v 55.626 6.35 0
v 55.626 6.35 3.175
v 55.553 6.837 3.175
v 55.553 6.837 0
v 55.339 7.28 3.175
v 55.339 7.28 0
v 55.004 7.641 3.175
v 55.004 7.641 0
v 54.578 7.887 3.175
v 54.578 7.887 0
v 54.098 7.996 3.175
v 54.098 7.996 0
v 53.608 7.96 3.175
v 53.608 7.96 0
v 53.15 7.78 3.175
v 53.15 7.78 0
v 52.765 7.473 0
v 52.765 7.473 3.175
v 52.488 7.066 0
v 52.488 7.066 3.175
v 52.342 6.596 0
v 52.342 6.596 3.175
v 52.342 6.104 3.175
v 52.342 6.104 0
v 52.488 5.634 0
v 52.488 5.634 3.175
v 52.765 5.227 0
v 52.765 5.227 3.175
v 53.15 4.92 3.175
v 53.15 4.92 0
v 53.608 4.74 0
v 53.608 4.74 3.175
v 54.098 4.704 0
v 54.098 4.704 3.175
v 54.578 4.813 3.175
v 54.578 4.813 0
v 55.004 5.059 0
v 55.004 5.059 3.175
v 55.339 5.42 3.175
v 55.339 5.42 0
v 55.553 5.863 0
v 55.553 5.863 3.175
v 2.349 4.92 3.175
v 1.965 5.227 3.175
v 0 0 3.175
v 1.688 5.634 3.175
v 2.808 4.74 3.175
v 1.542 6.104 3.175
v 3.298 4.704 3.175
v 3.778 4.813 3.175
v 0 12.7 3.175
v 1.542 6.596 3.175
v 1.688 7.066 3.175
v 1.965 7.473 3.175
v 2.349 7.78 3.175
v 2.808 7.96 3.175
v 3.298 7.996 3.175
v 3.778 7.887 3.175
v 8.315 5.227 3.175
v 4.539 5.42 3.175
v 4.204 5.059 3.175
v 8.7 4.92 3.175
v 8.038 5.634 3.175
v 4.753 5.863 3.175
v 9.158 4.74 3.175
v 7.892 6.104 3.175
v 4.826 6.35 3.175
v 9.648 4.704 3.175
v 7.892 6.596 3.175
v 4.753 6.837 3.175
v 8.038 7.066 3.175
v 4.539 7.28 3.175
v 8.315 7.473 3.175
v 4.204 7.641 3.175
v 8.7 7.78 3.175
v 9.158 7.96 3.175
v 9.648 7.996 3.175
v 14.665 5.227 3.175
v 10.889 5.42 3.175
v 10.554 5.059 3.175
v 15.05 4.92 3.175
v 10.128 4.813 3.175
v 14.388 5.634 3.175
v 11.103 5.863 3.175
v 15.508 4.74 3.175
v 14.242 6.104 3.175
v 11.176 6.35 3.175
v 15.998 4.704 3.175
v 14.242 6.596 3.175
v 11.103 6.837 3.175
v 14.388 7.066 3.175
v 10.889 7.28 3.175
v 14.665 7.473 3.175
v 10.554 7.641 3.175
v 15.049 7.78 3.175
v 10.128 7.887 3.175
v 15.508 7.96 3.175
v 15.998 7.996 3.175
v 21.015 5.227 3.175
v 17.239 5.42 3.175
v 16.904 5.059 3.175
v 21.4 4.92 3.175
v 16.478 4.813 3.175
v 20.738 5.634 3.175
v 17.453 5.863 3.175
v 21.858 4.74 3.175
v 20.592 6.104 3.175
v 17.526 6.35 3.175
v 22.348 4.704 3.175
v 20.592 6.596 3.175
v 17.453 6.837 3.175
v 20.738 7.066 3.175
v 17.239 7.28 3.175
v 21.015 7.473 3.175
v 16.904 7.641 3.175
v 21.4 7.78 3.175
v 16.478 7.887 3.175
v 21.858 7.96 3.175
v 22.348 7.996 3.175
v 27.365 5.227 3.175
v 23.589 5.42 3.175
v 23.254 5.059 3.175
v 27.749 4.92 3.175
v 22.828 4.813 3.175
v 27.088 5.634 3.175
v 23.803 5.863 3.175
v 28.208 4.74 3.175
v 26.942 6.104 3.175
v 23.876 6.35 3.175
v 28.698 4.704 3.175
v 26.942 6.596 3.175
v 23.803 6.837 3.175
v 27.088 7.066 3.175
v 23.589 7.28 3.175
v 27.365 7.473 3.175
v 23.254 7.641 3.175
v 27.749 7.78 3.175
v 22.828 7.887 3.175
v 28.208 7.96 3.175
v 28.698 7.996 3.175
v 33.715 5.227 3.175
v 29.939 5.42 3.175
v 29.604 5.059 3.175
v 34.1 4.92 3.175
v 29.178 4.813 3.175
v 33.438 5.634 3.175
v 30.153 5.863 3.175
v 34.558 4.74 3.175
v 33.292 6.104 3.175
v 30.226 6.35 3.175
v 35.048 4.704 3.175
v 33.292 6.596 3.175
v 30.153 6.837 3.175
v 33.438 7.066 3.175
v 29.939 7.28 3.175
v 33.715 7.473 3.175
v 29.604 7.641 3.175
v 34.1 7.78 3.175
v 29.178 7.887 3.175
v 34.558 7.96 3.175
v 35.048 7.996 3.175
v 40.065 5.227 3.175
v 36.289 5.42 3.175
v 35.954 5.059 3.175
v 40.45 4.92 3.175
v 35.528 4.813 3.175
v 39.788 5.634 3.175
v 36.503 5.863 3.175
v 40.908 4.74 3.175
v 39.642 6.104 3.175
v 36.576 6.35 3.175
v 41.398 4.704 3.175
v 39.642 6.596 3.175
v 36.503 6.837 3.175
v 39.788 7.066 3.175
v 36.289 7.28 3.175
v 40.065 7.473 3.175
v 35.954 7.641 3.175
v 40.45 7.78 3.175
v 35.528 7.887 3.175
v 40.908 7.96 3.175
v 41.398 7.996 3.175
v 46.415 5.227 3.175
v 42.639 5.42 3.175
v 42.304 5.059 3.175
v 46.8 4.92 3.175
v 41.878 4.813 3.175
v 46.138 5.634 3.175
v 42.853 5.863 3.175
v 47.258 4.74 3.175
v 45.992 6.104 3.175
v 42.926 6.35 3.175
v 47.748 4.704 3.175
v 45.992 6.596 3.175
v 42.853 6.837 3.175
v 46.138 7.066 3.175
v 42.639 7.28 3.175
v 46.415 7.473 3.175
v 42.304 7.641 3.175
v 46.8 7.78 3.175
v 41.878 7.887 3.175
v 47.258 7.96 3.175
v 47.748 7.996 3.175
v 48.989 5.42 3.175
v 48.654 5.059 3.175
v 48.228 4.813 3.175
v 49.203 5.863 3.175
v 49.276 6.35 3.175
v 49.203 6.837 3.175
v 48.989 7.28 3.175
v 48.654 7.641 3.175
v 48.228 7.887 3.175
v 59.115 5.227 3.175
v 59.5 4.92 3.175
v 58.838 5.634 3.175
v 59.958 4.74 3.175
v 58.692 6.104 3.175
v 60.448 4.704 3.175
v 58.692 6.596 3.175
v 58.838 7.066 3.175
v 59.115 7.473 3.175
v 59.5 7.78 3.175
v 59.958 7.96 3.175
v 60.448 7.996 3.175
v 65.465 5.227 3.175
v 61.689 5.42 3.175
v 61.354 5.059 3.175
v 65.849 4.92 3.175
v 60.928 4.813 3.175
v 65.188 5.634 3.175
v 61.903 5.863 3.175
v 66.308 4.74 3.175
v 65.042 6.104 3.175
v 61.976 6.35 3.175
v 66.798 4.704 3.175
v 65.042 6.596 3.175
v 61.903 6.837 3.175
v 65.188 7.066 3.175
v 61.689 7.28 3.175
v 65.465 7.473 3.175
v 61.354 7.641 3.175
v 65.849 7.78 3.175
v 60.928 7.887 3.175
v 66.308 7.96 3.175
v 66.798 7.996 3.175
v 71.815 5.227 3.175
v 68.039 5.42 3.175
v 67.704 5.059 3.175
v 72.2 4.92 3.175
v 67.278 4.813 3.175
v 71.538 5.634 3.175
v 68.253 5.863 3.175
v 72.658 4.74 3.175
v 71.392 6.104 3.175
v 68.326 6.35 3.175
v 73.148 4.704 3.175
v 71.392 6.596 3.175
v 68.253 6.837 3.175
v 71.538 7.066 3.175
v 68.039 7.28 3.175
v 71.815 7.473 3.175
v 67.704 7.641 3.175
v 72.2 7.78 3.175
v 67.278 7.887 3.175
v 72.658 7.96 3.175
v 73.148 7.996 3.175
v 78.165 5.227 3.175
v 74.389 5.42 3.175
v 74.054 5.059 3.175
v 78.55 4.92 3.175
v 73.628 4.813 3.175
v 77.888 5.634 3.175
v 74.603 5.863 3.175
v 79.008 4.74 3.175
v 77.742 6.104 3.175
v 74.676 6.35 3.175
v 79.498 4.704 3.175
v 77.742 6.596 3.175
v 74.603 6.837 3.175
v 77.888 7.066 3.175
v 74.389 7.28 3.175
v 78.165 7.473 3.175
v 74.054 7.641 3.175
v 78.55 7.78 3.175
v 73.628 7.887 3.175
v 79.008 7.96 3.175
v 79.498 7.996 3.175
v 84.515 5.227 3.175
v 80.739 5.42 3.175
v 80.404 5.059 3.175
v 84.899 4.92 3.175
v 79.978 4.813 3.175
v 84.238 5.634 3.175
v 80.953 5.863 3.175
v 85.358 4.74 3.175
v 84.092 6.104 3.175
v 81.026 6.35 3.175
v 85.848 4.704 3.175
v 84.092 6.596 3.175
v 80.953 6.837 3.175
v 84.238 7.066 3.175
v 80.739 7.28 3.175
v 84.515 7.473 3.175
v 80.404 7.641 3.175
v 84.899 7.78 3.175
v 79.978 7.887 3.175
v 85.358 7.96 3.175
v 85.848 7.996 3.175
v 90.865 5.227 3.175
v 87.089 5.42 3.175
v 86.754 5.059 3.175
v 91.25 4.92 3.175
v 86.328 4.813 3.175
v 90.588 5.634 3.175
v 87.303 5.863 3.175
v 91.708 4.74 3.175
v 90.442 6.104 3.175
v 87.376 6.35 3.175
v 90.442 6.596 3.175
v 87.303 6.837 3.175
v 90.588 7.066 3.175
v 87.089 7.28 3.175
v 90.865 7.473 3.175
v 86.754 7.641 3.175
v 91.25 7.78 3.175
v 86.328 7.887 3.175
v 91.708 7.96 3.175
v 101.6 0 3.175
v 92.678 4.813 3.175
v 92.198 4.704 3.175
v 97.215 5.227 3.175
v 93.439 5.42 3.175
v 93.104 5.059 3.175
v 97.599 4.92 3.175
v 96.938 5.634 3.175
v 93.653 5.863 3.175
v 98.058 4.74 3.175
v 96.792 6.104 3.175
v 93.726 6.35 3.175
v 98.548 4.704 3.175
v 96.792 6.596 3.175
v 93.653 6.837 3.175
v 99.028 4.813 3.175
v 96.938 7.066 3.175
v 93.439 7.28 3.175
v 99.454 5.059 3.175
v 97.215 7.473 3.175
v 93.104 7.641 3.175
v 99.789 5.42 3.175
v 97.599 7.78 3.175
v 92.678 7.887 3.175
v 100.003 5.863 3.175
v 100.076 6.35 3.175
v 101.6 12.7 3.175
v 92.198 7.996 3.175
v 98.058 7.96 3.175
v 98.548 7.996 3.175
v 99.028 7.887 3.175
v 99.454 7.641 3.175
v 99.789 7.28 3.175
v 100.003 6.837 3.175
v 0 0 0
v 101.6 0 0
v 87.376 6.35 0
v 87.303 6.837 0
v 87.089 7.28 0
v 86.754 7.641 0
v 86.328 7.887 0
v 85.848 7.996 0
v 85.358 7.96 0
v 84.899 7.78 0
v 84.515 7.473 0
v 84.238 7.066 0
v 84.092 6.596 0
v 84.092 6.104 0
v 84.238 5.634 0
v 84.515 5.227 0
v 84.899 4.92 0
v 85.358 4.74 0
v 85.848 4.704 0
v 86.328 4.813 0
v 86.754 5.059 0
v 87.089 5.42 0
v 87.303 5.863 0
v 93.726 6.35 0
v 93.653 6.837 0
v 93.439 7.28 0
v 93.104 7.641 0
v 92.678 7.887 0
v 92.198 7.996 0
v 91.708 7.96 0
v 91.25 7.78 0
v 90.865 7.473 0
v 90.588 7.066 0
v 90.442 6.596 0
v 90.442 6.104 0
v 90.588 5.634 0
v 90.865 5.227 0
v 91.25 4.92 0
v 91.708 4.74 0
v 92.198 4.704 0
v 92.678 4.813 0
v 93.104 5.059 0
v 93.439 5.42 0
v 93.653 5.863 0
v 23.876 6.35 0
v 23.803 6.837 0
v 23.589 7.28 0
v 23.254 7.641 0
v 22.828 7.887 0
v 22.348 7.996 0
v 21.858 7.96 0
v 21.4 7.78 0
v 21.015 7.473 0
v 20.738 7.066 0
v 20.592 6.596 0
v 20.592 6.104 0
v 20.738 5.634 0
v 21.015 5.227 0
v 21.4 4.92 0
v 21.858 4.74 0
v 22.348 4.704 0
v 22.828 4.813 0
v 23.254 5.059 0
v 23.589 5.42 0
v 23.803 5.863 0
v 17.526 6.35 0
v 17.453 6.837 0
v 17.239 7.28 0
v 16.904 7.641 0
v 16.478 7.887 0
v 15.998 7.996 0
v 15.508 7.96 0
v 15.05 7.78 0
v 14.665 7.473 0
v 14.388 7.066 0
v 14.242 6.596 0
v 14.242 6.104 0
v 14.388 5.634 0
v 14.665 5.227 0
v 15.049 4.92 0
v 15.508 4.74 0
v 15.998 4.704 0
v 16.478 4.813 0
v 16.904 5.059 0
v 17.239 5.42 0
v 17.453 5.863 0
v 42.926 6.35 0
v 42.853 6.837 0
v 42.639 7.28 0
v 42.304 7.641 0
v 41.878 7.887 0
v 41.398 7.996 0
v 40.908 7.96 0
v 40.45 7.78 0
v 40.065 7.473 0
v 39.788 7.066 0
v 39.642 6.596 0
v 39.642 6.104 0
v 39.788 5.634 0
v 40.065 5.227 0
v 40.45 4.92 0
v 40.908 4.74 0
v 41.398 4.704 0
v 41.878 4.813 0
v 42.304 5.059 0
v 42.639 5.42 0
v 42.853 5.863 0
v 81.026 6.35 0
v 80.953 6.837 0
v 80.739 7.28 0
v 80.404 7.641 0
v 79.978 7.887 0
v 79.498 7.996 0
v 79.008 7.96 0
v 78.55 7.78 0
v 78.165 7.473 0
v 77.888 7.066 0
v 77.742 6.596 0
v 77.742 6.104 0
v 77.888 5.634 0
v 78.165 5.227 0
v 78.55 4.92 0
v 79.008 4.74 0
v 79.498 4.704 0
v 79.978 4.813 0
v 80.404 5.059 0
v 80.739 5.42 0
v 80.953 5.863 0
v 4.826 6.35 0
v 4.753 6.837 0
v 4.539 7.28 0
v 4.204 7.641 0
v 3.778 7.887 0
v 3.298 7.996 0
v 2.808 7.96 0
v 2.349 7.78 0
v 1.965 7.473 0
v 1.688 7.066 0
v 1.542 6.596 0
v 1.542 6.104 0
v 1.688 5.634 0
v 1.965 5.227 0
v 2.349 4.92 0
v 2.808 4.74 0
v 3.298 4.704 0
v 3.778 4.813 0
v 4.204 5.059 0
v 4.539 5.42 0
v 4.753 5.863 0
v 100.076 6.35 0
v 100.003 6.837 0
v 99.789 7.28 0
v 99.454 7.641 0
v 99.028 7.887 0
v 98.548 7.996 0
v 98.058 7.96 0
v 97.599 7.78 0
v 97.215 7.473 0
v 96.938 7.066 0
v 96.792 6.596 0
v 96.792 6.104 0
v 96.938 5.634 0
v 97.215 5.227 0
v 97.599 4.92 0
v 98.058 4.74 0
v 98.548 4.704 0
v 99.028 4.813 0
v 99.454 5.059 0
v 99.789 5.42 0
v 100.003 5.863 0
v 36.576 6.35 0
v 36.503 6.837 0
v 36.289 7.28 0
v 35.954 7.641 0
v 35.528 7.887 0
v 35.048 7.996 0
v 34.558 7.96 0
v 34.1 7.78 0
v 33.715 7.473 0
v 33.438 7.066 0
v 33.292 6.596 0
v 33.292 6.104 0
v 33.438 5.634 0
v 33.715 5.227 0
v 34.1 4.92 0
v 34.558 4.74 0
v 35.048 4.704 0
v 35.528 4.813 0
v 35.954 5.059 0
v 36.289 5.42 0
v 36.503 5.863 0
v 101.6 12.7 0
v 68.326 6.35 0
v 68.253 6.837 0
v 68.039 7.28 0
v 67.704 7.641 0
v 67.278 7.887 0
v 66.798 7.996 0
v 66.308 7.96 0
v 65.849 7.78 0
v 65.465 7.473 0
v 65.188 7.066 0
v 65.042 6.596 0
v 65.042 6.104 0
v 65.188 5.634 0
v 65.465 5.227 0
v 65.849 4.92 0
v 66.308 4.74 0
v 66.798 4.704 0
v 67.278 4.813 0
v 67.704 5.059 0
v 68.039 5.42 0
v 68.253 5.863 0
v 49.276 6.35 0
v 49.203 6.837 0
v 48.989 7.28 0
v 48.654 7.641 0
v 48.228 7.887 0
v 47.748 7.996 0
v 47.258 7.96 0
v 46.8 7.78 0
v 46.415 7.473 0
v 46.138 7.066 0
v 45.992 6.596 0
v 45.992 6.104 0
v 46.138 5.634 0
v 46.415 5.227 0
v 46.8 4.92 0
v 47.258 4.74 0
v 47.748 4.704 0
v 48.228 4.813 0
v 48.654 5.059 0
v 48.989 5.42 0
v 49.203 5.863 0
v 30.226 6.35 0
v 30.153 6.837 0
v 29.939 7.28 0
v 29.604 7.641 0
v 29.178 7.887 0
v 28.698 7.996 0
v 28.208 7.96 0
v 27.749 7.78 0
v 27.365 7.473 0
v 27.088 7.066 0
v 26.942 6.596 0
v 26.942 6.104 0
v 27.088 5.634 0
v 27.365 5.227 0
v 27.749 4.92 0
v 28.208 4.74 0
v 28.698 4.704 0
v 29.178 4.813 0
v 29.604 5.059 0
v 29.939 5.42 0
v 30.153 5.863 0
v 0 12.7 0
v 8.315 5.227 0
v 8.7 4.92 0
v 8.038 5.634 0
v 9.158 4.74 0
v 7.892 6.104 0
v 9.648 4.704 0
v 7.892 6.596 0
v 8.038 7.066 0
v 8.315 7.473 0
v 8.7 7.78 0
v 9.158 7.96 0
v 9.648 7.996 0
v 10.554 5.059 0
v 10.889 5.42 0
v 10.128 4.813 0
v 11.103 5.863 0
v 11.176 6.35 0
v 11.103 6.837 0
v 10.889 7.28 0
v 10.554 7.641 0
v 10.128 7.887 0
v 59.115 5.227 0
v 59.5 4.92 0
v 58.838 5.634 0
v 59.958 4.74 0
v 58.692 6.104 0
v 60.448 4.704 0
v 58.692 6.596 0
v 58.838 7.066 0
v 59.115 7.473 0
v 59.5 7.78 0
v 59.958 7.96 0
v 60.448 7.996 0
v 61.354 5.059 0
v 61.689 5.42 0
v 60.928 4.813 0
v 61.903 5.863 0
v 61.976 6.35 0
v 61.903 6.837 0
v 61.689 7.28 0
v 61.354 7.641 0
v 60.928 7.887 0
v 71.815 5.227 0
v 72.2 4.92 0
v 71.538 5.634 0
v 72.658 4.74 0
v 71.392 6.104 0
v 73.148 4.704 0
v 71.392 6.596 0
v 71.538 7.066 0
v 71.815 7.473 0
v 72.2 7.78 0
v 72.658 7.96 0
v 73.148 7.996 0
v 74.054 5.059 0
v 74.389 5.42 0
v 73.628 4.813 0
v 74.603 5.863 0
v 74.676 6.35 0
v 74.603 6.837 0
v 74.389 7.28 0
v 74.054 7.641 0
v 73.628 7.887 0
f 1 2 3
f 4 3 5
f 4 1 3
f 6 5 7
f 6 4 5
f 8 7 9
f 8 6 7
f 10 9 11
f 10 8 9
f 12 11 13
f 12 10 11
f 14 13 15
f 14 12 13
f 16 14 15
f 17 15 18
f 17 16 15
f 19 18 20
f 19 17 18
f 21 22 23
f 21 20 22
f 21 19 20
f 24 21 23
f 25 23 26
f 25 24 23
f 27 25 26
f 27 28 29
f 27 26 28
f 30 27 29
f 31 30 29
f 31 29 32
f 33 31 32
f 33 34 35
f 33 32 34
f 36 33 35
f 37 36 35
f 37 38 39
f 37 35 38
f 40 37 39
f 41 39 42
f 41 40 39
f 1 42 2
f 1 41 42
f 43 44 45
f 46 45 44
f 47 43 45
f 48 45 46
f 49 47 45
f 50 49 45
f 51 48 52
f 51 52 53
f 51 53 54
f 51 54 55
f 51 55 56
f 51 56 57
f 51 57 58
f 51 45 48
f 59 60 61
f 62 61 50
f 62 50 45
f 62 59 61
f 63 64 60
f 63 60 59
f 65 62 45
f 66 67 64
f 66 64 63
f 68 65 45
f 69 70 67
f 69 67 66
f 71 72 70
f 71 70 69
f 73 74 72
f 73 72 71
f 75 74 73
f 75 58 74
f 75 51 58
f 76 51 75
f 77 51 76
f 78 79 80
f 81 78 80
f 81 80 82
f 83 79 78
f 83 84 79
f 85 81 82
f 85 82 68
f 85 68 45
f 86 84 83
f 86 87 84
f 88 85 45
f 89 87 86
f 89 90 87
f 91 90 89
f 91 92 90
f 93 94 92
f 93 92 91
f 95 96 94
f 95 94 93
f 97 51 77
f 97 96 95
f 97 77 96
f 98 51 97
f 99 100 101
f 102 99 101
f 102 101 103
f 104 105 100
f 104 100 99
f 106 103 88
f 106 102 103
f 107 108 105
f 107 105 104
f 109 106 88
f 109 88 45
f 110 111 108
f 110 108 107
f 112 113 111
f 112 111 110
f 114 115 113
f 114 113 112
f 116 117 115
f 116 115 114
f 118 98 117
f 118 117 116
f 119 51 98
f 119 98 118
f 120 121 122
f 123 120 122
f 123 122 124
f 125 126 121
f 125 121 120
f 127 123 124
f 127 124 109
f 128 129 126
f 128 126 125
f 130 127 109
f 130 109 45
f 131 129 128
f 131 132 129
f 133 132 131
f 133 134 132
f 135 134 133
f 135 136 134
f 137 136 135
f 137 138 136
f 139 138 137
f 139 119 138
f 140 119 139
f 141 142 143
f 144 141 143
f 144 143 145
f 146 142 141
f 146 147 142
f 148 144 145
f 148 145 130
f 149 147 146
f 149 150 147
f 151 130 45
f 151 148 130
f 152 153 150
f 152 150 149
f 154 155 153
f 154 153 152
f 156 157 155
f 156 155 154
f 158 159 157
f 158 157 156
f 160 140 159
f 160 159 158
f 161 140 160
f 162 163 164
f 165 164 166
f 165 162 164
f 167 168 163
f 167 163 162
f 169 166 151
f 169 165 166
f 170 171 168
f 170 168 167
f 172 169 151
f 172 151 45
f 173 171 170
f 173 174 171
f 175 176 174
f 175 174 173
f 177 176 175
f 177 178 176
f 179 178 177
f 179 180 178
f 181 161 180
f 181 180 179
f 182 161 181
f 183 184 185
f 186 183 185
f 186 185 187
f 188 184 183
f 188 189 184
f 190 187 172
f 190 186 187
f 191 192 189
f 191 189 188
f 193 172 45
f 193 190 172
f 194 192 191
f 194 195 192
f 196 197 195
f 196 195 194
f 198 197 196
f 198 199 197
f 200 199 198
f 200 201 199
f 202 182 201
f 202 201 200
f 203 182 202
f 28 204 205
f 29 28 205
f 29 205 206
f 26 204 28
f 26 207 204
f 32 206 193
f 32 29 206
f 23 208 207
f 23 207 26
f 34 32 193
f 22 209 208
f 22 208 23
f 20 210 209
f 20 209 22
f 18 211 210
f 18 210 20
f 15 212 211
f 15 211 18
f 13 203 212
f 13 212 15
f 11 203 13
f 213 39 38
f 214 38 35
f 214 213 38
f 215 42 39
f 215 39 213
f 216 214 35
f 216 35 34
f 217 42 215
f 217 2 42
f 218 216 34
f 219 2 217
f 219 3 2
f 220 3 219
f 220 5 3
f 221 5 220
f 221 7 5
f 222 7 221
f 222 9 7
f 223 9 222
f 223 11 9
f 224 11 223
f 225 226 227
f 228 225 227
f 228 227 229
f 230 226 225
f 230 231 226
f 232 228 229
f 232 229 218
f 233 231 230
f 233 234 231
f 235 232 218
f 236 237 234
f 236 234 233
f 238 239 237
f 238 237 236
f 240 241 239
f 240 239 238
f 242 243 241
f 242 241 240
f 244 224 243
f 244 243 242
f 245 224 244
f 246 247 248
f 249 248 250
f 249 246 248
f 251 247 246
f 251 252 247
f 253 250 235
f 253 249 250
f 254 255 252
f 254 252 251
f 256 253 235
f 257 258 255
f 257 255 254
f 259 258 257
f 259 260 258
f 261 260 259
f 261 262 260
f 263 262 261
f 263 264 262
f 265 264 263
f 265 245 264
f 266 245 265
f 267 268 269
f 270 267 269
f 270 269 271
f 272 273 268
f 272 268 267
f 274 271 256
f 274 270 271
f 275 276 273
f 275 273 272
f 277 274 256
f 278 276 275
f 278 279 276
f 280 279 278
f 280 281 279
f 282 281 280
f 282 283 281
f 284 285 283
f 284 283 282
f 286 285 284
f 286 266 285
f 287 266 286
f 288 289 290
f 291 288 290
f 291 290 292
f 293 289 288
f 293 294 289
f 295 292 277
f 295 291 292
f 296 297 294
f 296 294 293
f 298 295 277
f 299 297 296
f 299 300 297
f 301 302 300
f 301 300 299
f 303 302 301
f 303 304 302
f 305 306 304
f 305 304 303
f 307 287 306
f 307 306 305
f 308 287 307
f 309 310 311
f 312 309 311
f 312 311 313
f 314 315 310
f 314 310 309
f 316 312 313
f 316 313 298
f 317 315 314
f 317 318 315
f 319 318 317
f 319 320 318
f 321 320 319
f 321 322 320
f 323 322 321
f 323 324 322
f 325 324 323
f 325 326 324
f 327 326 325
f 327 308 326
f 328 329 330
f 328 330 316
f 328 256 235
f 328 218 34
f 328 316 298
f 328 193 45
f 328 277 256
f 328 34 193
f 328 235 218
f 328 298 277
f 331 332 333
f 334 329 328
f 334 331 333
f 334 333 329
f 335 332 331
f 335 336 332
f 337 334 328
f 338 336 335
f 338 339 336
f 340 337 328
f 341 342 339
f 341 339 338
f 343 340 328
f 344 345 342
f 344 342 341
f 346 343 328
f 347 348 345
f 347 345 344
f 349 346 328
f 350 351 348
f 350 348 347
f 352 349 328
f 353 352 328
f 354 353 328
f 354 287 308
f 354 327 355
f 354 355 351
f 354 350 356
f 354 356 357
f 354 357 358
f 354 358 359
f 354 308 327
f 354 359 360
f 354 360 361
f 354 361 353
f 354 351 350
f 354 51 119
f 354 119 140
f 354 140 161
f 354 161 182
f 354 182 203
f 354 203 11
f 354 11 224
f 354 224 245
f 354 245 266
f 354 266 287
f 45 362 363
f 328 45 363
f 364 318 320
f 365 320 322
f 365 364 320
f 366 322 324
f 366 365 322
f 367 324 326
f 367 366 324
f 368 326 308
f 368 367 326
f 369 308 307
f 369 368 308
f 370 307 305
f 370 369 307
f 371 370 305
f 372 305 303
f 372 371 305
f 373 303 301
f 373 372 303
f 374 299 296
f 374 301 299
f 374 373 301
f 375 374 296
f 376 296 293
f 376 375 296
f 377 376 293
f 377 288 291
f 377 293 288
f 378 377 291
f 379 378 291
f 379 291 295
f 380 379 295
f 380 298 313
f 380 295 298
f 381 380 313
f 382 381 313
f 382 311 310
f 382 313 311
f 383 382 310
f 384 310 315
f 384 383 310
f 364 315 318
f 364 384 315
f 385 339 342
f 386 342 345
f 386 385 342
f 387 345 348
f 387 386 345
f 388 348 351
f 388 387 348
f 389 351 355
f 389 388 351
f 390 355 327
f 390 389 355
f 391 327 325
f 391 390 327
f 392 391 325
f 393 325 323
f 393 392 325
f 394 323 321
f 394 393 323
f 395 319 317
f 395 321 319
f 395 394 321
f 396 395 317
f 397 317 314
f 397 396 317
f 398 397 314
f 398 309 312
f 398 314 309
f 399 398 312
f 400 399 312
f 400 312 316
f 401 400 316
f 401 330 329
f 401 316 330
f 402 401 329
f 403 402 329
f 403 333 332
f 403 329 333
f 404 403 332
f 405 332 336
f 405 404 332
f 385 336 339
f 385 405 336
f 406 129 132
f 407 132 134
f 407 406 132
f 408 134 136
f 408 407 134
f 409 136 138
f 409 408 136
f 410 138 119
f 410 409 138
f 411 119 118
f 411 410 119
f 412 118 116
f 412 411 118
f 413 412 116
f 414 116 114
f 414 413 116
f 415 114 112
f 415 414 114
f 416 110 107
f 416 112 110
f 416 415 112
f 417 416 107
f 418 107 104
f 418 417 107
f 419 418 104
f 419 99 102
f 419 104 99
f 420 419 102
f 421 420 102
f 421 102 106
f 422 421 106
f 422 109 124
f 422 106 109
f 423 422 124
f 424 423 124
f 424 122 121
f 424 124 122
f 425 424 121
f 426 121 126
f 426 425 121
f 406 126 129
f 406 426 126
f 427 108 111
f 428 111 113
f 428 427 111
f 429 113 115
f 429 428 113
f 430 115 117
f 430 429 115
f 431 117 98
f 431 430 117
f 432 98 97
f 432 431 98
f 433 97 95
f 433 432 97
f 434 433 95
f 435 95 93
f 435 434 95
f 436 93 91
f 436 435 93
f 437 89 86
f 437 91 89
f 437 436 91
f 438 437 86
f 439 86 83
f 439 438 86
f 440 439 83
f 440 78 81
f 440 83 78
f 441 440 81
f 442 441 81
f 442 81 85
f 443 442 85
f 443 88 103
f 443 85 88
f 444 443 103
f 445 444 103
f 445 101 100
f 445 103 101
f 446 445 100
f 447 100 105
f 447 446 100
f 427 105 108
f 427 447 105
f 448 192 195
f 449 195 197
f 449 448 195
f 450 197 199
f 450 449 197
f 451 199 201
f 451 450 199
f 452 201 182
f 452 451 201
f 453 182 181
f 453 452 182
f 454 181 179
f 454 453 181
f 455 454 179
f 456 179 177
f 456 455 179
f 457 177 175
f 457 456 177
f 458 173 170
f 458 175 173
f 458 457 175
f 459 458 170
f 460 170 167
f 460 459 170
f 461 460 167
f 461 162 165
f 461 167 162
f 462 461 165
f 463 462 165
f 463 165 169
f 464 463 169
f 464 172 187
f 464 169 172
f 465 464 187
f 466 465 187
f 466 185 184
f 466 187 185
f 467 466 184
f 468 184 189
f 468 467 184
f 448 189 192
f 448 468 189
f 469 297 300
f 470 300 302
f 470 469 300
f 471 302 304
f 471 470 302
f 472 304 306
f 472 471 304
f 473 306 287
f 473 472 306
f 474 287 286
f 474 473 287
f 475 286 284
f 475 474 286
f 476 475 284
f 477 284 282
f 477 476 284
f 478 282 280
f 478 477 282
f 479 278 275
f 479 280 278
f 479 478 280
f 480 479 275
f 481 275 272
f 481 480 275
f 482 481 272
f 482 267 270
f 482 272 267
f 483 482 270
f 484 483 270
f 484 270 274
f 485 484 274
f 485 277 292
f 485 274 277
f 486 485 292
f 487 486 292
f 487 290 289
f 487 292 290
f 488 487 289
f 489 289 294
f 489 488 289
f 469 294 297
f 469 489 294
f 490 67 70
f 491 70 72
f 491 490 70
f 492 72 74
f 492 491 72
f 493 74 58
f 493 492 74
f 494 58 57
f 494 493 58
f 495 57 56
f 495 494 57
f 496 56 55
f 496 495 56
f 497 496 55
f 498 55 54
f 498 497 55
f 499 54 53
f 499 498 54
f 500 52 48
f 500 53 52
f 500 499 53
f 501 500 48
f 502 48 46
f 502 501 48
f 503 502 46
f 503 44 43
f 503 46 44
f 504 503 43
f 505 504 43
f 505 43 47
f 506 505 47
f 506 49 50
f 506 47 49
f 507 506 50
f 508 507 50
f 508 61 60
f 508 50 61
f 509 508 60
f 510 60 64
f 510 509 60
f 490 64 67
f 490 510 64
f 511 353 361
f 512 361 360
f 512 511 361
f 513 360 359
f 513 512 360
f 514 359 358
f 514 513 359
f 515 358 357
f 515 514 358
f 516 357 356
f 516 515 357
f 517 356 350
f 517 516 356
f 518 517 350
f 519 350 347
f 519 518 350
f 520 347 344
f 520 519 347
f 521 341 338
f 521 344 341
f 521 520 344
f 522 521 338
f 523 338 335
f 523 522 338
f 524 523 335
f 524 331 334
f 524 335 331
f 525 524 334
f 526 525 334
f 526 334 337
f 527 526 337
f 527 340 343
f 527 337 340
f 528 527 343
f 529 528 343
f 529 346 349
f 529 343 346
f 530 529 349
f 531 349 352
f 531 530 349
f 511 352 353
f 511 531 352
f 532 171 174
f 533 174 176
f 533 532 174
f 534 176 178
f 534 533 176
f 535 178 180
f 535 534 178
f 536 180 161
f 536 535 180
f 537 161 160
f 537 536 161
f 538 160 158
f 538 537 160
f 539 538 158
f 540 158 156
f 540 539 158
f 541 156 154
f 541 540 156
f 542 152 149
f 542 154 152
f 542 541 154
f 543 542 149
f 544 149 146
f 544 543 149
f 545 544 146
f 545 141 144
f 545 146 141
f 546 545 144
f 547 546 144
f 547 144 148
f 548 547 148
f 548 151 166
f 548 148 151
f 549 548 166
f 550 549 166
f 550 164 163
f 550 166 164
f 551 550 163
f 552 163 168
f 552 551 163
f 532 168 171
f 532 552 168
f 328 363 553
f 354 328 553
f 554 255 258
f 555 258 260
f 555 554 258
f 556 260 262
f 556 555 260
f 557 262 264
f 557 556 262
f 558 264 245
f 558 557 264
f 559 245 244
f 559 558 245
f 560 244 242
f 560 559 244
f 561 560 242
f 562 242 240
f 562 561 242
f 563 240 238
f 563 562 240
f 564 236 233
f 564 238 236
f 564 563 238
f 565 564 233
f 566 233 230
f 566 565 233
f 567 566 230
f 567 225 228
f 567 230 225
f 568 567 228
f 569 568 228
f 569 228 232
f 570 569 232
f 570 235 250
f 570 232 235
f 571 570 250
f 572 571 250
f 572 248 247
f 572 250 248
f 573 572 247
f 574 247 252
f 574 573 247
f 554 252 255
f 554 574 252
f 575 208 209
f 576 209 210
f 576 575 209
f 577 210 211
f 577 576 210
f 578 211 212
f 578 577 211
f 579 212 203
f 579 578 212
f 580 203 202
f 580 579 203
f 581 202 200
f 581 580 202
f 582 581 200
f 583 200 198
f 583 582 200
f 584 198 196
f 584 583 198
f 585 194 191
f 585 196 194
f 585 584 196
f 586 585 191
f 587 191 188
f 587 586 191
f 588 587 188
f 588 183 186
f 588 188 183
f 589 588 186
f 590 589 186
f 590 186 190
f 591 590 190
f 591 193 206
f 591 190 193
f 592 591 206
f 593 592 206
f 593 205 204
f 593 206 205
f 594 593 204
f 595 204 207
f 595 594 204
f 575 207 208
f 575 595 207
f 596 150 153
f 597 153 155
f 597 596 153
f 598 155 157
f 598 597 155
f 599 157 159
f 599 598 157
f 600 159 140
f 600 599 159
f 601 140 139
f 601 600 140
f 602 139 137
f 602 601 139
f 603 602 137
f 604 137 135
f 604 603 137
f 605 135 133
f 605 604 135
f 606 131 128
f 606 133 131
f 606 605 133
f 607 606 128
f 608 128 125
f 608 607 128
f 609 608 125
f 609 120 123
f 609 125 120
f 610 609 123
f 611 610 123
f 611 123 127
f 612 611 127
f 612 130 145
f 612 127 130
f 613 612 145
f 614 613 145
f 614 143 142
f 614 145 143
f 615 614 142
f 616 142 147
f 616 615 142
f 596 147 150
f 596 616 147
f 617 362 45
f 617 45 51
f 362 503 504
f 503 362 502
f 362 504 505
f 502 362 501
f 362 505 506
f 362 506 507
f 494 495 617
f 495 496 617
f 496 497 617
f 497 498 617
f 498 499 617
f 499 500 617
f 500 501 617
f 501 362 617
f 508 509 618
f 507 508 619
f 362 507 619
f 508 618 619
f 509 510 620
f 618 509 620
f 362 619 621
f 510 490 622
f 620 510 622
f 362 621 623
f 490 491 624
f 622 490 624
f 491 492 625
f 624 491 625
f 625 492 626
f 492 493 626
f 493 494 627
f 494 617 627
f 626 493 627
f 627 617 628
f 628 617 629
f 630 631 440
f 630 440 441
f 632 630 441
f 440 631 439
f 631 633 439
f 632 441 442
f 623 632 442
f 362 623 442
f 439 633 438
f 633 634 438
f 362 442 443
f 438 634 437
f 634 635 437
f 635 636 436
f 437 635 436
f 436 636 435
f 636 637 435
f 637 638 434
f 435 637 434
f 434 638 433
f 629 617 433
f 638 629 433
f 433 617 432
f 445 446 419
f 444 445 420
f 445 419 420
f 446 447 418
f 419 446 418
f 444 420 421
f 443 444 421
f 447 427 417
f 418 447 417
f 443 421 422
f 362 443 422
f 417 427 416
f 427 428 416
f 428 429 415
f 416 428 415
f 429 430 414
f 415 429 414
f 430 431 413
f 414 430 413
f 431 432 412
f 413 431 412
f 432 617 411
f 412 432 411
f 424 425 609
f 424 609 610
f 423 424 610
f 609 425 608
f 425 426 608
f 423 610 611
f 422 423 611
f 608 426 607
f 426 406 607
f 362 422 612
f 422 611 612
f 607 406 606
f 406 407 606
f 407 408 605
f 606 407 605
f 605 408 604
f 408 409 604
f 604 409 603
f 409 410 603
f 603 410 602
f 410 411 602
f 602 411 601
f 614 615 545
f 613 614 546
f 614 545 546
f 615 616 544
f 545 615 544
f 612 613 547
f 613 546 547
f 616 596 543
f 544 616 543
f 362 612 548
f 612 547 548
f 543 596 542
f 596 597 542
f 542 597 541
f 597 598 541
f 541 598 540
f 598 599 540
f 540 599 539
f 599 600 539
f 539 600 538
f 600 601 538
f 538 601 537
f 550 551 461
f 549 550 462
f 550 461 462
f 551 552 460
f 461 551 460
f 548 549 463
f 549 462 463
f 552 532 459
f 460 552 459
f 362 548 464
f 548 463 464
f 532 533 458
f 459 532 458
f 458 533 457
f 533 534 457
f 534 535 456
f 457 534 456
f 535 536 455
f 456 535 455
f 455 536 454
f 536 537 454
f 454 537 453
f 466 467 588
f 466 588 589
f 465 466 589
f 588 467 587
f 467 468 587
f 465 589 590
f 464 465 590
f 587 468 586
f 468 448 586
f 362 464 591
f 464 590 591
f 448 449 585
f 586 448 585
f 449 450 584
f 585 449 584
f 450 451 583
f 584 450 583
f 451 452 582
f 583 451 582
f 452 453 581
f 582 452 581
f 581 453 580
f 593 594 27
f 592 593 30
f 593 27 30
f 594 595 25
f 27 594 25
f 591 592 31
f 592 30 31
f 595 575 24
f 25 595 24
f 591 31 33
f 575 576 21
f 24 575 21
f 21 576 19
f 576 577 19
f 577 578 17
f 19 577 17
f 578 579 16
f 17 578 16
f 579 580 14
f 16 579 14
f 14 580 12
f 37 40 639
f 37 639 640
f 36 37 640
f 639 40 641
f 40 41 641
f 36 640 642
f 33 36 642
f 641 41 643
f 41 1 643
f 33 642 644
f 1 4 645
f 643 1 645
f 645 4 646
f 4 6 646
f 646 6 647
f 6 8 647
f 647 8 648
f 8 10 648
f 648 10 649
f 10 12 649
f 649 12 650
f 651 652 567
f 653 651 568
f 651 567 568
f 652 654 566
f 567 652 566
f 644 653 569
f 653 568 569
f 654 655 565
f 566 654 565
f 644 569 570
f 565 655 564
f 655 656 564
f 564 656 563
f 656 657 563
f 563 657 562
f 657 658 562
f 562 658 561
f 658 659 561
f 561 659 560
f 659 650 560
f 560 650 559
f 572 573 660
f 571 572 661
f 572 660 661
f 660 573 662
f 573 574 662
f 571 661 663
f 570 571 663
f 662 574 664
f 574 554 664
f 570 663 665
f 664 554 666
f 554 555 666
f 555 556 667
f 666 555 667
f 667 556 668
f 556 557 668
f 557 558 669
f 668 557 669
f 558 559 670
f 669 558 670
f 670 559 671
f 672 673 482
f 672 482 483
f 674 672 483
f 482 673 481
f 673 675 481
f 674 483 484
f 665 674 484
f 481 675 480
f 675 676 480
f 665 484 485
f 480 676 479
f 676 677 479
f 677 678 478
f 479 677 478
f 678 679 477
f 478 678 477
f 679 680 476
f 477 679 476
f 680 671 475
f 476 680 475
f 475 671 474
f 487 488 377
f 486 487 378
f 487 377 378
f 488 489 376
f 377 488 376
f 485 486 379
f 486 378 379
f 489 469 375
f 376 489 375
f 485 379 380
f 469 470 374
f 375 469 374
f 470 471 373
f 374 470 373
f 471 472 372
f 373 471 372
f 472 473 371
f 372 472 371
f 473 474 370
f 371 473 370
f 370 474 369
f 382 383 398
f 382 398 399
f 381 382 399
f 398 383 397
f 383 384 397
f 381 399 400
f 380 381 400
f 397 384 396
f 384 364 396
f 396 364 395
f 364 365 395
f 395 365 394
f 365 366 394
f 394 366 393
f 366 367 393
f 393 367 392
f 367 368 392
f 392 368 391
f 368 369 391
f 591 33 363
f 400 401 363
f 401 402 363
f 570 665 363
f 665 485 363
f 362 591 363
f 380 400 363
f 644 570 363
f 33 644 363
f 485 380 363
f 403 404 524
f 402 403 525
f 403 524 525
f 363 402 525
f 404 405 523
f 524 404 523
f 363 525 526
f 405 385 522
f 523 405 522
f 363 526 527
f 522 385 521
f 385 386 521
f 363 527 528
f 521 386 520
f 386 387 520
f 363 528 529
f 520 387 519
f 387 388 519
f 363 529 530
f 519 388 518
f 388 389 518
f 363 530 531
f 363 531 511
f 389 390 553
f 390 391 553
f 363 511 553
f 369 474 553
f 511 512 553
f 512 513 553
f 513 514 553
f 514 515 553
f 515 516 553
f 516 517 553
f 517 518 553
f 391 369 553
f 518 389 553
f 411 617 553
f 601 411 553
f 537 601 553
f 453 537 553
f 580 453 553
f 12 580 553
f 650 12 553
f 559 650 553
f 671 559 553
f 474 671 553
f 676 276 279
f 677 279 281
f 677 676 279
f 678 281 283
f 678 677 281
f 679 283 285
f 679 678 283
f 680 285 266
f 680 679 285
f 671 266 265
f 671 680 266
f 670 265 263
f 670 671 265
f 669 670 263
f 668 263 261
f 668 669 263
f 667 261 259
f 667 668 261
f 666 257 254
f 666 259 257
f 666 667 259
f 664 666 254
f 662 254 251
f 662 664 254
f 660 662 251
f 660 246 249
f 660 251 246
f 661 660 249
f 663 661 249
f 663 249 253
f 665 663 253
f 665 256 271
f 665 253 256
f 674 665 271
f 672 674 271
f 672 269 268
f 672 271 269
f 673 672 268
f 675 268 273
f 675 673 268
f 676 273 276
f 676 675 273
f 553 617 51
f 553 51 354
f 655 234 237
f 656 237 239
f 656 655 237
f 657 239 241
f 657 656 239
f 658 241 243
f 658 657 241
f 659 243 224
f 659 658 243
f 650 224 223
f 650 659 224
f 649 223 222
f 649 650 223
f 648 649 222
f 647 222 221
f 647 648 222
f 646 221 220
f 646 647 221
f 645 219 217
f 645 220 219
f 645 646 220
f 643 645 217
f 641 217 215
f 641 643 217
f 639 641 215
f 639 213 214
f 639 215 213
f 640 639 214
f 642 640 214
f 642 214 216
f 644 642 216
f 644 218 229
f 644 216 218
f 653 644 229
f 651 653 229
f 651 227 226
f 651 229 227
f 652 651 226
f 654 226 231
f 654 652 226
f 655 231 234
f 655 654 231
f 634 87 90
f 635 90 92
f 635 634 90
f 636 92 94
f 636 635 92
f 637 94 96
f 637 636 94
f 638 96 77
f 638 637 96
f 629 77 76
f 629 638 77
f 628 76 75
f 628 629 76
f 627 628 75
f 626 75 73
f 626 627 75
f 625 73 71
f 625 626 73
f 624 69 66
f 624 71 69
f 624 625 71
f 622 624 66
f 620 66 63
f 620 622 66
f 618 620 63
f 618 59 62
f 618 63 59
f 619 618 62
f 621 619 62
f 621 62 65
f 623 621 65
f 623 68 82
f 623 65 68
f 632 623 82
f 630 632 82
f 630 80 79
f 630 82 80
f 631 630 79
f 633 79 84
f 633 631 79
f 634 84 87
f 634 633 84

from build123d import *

# Parameters (mm, degrees)
SKETCH1_W               = 101.6
SKETCH1_H               = 12.7
BOSS_EXTRUDE3_DEPTH     = 3.175
SKETCH2_R               = 1.651
CUT_EXTRUDE1_DEPTH      = 127
CUT_EXTRUDE1_DEPTH_BACK = 127


with BuildPart() as part:
    # Sketch1 → Boss-Extrude3 (new body)
    with BuildSketch(Plane.XY):
        with Locations((50.8, 6.35)):
            Rectangle(SKETCH1_W, SKETCH1_H)
    extrude(amount=BOSS_EXTRUDE3_DEPTH)

    # Sketch2 → Cut-Extrude1 (cut, two sides)
    with BuildSketch(Plane.XY) as cut_extrude1_sk:
        with Locations((3.175, 6.35)):
            Circle(SKETCH2_R)
        with Locations((9.525, 6.35)):
            Circle(SKETCH2_R)
        with Locations((15.875, 6.35)):
            Circle(SKETCH2_R)
        with Locations((22.225, 6.35)):
            Circle(SKETCH2_R)
        with Locations((28.575, 6.35)):
            Circle(SKETCH2_R)
        with Locations((34.925, 6.35)):
            Circle(SKETCH2_R)
        with Locations((41.275, 6.35)):
            Circle(SKETCH2_R)
        with Locations((47.625, 6.35)):
            Circle(SKETCH2_R)
        with Locations((53.975, 6.35)):
            Circle(SKETCH2_R)
        with Locations((60.325, 6.35)):
            Circle(SKETCH2_R)
        with Locations((66.675, 6.35)):
            Circle(SKETCH2_R)
        with Locations((73.025, 6.35)):
            Circle(SKETCH2_R)
        with Locations((79.375, 6.35)):
            Circle(SKETCH2_R)
        with Locations((85.725, 6.35)):
            Circle(SKETCH2_R)
        with Locations((92.075, 6.35)):
            Circle(SKETCH2_R)
        with Locations((98.425, 6.35)):
            Circle(SKETCH2_R)
    extrude(amount=CUT_EXTRUDE1_DEPTH, mode=Mode.SUBTRACT)
    extrude(cut_extrude1_sk.sketch, amount=-CUT_EXTRUDE1_DEPTH_BACK, mode=Mode.SUBTRACT)


solid = part.part
